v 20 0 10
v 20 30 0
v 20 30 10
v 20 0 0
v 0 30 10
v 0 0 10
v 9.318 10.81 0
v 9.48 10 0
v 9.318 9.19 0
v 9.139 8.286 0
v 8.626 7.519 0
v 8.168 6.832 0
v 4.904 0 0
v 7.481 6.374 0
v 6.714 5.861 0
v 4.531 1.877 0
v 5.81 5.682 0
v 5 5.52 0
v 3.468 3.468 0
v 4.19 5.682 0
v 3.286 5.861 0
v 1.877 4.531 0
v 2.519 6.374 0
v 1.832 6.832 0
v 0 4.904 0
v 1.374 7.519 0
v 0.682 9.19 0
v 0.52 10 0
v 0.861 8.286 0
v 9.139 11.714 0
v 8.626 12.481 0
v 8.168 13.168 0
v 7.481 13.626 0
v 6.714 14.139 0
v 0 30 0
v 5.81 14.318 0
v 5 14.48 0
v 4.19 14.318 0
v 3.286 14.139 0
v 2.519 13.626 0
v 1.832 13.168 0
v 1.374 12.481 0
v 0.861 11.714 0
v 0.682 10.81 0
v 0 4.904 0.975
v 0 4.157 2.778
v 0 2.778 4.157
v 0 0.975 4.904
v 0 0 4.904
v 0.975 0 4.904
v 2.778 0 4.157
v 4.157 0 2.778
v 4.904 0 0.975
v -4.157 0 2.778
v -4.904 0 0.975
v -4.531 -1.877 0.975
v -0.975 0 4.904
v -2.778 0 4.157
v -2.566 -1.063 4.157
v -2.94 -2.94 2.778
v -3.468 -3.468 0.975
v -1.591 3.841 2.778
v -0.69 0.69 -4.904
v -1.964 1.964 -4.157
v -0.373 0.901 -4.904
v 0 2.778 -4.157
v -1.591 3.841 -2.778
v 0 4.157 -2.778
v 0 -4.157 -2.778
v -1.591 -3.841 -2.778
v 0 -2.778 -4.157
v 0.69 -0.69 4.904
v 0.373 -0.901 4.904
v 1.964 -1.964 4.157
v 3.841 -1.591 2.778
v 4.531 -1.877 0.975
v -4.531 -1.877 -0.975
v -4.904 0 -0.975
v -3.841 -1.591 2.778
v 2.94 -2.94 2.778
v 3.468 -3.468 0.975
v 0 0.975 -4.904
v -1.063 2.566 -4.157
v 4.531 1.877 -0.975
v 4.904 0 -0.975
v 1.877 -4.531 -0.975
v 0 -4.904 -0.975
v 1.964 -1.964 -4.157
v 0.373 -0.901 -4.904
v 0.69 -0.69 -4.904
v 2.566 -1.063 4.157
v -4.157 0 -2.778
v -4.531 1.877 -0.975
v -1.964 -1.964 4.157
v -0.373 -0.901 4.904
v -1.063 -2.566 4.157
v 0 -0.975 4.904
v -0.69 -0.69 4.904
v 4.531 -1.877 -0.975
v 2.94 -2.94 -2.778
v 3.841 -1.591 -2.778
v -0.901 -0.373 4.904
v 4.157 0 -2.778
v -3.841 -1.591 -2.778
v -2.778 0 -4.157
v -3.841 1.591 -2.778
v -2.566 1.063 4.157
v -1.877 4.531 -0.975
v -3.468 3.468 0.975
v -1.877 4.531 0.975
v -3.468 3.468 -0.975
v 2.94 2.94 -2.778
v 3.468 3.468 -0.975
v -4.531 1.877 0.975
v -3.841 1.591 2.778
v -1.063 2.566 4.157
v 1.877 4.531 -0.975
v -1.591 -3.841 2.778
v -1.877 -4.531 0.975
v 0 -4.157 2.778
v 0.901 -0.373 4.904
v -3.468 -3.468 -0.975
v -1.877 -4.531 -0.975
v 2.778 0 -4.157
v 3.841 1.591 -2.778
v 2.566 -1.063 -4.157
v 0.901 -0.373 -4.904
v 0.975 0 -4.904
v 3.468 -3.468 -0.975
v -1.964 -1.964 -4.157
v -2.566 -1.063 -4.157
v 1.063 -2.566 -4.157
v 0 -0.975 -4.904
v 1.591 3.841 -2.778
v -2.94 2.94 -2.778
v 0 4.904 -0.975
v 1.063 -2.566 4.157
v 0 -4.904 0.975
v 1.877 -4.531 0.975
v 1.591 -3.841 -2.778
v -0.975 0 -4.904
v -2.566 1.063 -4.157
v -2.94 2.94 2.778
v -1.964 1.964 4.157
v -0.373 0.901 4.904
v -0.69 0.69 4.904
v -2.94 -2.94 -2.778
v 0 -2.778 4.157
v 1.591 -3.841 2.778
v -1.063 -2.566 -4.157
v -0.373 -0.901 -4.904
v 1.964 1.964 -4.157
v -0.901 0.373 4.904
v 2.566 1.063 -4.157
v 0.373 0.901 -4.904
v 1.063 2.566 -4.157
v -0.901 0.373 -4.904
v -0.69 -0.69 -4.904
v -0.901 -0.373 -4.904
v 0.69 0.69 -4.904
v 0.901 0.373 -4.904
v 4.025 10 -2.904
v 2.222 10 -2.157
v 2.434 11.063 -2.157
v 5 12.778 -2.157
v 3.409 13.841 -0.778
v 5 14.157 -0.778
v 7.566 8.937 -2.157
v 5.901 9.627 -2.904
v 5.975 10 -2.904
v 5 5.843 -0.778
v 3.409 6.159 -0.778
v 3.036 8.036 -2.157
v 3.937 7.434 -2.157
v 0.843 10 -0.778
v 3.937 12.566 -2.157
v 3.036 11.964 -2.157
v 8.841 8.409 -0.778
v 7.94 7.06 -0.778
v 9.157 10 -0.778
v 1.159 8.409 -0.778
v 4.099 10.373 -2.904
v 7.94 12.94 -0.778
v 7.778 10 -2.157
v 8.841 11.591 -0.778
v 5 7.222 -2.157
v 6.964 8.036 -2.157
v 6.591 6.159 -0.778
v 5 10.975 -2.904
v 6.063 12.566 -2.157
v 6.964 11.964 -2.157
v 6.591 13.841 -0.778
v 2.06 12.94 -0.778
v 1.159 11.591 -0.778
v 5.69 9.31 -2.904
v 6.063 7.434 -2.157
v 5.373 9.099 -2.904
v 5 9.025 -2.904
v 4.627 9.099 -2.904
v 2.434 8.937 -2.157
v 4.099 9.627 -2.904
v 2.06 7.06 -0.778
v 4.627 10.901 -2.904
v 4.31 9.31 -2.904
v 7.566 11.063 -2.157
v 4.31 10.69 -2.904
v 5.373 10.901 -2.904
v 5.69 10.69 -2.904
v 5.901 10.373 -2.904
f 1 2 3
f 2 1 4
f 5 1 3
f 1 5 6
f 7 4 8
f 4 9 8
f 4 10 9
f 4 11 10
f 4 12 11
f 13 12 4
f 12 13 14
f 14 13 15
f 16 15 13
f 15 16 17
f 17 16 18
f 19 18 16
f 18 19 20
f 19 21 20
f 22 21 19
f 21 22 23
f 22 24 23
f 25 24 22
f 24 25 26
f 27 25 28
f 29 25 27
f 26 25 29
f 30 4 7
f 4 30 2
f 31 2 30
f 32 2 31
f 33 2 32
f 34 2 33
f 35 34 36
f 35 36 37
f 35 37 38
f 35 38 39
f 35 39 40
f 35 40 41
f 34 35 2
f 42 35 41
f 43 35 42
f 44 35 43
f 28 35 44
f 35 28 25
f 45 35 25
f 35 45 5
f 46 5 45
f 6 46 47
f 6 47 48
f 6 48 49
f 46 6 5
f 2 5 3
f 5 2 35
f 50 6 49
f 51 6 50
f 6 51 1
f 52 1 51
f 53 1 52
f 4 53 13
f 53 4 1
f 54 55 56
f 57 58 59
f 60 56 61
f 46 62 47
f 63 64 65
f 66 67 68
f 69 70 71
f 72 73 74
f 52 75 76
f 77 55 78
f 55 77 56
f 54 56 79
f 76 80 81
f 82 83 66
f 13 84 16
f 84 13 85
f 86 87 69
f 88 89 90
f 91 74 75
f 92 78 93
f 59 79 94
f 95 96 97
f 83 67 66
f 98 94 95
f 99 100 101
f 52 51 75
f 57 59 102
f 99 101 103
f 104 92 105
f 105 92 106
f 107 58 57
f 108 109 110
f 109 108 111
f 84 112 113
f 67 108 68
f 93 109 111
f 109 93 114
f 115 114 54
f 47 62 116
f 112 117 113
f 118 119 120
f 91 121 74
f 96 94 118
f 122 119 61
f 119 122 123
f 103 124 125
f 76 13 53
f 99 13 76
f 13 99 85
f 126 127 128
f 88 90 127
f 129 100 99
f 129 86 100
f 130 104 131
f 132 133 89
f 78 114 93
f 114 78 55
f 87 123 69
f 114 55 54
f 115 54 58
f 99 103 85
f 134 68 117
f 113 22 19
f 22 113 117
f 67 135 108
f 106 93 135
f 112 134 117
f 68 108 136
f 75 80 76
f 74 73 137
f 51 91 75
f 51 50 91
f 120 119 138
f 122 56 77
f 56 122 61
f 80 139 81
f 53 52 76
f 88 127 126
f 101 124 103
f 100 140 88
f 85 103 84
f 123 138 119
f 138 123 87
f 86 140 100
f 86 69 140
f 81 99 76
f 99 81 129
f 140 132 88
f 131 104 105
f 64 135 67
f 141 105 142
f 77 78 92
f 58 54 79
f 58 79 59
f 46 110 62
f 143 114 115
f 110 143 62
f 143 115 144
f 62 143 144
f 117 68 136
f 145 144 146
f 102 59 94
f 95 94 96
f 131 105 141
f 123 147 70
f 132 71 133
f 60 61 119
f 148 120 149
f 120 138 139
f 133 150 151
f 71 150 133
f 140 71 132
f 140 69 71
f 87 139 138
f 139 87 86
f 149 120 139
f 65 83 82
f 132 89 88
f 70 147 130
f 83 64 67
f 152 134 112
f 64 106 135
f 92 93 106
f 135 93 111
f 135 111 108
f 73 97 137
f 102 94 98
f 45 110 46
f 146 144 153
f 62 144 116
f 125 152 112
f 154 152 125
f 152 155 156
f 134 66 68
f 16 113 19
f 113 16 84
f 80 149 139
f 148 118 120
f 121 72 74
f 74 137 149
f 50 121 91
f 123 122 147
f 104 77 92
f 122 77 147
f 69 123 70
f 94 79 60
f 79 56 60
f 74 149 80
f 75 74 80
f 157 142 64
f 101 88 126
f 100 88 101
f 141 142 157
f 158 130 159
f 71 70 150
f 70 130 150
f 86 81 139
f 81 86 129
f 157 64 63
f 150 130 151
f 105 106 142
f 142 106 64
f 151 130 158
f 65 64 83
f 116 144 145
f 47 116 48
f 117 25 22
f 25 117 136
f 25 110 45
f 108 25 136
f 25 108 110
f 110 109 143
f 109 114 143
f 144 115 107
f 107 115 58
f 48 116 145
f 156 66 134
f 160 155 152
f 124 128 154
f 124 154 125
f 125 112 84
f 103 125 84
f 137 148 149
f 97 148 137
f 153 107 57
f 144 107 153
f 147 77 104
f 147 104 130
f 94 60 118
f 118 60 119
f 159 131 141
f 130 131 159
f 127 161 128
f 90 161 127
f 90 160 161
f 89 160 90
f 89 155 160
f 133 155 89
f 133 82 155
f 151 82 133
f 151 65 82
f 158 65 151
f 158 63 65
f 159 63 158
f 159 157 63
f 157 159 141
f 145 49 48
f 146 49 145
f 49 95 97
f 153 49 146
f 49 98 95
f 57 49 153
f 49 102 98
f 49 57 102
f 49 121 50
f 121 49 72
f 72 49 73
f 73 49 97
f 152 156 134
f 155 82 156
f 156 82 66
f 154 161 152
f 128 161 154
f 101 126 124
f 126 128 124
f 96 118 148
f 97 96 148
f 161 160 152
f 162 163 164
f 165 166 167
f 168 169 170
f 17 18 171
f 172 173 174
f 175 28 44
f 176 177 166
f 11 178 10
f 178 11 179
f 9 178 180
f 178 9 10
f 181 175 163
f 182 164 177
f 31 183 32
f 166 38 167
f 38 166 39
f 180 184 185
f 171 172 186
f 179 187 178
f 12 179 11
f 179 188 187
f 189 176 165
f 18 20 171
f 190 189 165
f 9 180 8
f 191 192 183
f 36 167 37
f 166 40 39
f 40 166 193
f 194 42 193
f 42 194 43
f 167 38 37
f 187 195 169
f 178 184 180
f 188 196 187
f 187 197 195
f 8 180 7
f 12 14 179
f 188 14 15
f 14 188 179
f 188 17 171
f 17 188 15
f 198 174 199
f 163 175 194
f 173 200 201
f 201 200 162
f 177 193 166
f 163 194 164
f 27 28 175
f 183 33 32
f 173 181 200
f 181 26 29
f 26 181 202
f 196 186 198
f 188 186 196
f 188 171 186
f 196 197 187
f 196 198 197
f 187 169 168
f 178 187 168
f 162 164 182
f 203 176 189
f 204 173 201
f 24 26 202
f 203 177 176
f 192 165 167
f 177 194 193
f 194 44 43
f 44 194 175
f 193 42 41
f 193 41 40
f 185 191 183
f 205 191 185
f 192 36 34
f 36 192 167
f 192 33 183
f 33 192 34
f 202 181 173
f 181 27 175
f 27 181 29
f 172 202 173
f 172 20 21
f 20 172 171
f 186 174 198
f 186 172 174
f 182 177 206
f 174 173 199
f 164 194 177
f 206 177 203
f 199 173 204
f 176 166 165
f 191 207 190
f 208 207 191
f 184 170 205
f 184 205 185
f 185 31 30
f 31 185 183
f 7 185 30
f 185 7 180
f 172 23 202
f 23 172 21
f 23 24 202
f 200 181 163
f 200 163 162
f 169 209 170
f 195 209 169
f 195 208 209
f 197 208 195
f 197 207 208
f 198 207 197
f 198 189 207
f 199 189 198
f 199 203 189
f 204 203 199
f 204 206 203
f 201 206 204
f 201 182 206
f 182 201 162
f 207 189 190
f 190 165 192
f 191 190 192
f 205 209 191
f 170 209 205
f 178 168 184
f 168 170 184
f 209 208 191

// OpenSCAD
// Define a cube
cube([20, 30, 10]);

// Define a sphere
sphere(r=5);

// Translate the sphere
translate([5, 10, 2]) sphere(r=5);
